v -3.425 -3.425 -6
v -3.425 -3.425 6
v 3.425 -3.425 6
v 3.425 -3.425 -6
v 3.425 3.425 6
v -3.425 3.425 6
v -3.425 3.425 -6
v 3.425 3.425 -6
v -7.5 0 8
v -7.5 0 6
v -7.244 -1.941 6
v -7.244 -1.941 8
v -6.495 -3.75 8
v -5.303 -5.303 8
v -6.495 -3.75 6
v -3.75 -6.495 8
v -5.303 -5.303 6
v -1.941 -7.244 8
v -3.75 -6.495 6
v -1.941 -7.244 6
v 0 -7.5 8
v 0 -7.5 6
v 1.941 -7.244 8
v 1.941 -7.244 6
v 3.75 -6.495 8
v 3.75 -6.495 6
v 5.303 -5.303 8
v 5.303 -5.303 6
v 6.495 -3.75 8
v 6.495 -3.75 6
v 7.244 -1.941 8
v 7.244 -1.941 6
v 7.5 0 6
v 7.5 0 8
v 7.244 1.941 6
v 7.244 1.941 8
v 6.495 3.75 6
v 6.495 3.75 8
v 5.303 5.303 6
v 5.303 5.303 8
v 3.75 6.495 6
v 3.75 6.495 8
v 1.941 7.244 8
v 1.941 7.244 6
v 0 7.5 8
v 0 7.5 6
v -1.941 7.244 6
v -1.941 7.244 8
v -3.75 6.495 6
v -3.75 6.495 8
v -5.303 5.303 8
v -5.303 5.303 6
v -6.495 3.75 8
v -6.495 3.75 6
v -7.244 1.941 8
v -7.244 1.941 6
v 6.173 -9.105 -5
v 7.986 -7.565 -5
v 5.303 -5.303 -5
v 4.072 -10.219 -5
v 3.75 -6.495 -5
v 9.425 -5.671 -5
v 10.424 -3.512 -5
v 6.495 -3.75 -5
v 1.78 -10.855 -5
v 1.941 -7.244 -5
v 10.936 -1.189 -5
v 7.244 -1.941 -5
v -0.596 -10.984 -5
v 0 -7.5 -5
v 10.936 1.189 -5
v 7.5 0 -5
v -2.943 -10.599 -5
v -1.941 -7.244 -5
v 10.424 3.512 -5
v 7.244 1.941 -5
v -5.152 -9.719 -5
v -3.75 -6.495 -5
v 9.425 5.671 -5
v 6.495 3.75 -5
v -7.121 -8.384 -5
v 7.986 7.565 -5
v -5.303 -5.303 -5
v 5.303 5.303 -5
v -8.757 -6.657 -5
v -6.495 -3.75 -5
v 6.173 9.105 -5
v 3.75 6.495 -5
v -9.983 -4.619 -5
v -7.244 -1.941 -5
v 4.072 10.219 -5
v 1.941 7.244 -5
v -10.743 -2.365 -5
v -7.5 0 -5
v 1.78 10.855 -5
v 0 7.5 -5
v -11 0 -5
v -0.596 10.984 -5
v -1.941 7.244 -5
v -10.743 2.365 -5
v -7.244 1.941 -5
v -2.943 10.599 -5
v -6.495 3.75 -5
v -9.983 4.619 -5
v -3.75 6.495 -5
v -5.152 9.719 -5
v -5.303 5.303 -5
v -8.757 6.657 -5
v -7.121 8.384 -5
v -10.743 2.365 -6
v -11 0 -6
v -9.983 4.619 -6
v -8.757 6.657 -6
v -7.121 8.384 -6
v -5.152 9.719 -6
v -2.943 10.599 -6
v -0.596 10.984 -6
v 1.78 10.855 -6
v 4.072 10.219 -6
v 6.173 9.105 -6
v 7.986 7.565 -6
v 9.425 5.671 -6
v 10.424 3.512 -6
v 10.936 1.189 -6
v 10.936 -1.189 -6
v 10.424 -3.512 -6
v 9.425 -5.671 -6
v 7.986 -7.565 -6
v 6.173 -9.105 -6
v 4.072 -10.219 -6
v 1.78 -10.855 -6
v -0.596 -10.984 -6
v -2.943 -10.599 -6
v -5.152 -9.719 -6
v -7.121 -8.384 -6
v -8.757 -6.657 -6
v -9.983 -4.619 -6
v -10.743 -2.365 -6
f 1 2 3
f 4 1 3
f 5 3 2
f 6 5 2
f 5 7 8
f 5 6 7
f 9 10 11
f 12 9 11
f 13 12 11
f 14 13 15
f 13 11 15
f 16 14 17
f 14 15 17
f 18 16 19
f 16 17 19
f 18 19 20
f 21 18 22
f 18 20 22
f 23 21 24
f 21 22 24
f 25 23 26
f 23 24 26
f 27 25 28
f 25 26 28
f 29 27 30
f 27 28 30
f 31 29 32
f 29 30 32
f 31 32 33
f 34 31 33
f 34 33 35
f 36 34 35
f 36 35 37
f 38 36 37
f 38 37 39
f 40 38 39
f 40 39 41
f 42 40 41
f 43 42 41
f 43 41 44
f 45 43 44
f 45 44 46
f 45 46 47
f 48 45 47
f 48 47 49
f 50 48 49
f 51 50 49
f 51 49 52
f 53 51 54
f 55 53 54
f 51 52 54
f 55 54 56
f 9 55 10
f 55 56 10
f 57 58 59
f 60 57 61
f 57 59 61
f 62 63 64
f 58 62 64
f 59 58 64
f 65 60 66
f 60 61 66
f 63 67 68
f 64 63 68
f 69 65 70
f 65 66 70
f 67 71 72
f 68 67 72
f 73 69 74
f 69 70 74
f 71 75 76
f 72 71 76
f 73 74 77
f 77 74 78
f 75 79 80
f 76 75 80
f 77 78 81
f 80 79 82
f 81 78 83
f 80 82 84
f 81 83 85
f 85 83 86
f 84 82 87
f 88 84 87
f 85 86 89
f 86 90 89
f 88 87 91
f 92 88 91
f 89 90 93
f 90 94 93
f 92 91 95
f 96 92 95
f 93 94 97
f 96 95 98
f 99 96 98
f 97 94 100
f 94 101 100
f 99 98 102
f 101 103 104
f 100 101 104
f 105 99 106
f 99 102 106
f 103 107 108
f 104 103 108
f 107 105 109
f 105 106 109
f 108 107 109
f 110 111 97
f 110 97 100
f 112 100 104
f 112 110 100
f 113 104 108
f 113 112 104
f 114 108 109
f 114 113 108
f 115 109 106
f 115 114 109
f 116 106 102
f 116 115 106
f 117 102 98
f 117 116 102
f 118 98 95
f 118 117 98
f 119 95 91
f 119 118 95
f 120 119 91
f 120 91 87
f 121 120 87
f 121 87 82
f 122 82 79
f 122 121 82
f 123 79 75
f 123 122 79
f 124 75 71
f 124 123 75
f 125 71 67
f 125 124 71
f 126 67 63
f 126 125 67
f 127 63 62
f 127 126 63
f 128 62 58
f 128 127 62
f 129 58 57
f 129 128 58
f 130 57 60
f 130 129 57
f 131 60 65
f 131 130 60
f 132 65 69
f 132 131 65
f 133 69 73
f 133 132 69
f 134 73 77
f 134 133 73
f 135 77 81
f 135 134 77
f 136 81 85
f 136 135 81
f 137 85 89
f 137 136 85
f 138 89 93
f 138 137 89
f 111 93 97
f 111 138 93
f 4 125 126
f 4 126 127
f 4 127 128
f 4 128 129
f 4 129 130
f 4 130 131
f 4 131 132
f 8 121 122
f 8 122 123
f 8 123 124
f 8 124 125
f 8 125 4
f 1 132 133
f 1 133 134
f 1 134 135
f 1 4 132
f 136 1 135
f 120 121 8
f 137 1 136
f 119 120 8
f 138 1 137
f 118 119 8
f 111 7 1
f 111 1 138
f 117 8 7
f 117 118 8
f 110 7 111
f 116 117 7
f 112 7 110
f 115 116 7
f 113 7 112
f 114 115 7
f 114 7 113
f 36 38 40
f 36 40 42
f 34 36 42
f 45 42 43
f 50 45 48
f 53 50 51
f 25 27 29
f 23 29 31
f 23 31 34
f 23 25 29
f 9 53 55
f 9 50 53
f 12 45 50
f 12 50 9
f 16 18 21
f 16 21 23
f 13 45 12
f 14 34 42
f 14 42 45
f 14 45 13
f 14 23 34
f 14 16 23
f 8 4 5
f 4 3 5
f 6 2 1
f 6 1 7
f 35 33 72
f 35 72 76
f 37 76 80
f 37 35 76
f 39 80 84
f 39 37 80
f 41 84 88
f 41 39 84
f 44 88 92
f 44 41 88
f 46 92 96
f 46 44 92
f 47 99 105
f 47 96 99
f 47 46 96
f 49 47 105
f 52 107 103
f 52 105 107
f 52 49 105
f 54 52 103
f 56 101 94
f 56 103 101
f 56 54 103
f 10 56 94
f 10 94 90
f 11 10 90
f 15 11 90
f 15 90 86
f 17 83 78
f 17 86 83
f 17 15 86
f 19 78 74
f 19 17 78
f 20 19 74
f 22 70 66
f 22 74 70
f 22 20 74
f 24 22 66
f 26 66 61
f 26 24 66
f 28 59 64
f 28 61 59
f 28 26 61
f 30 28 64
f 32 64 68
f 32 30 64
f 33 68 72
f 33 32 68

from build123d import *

# Parameters (mm, degrees)
SKETCH1_R           = 7.5
SKETCH1_W           = 6.85
SKETCH1_H           = 6.85
BOSS_EXTRUDE1_DEPTH = 6
SKETCH2_R           = 11
SKETCH2_R_2         = 7.5
BOSS_EXTRUDE2_DEPTH = 1
BOSS_EXTRUDE3_START = 6
SKETCH1_2_R         = 7.5
SKETCH1_2_W         = 6.85
SKETCH1_2_H         = 6.85
BOSS_EXTRUDE3_DEPTH = 2


with BuildPart() as part:
    # Sketch1 → Boss-Extrude1 (new, symmetric)
    with BuildSketch(Plane.XY):
        Circle(SKETCH1_R)
        Rectangle(SKETCH1_W, SKETCH1_H, mode=Mode.SUBTRACT)
    extrude(amount=BOSS_EXTRUDE1_DEPTH, both=True)

    # Sketch2 → Boss-Extrude2 (add)
    with BuildSketch(Plane(origin=(0, 0, -6), x_dir=(-1, 0, 0), z_dir=(0, 0, -1))):
        Circle(SKETCH2_R)
        Circle(SKETCH2_R_2, mode=Mode.SUBTRACT)
    extrude(amount=-BOSS_EXTRUDE2_DEPTH)

    # Sketch1<2> → Boss-Extrude3 (add)
    with BuildSketch(Plane.XY.offset(BOSS_EXTRUDE3_START)):
        with Locations(Location((0, 0, 0), (0, 0, 180))):
            Circle(SKETCH1_2_R)
        Rectangle(SKETCH1_2_W, SKETCH1_2_H, mode=Mode.SUBTRACT)
        Rectangle(SKETCH1_2_W, SKETCH1_2_H)
    extrude(amount=BOSS_EXTRUDE3_DEPTH)


solid = part.part
